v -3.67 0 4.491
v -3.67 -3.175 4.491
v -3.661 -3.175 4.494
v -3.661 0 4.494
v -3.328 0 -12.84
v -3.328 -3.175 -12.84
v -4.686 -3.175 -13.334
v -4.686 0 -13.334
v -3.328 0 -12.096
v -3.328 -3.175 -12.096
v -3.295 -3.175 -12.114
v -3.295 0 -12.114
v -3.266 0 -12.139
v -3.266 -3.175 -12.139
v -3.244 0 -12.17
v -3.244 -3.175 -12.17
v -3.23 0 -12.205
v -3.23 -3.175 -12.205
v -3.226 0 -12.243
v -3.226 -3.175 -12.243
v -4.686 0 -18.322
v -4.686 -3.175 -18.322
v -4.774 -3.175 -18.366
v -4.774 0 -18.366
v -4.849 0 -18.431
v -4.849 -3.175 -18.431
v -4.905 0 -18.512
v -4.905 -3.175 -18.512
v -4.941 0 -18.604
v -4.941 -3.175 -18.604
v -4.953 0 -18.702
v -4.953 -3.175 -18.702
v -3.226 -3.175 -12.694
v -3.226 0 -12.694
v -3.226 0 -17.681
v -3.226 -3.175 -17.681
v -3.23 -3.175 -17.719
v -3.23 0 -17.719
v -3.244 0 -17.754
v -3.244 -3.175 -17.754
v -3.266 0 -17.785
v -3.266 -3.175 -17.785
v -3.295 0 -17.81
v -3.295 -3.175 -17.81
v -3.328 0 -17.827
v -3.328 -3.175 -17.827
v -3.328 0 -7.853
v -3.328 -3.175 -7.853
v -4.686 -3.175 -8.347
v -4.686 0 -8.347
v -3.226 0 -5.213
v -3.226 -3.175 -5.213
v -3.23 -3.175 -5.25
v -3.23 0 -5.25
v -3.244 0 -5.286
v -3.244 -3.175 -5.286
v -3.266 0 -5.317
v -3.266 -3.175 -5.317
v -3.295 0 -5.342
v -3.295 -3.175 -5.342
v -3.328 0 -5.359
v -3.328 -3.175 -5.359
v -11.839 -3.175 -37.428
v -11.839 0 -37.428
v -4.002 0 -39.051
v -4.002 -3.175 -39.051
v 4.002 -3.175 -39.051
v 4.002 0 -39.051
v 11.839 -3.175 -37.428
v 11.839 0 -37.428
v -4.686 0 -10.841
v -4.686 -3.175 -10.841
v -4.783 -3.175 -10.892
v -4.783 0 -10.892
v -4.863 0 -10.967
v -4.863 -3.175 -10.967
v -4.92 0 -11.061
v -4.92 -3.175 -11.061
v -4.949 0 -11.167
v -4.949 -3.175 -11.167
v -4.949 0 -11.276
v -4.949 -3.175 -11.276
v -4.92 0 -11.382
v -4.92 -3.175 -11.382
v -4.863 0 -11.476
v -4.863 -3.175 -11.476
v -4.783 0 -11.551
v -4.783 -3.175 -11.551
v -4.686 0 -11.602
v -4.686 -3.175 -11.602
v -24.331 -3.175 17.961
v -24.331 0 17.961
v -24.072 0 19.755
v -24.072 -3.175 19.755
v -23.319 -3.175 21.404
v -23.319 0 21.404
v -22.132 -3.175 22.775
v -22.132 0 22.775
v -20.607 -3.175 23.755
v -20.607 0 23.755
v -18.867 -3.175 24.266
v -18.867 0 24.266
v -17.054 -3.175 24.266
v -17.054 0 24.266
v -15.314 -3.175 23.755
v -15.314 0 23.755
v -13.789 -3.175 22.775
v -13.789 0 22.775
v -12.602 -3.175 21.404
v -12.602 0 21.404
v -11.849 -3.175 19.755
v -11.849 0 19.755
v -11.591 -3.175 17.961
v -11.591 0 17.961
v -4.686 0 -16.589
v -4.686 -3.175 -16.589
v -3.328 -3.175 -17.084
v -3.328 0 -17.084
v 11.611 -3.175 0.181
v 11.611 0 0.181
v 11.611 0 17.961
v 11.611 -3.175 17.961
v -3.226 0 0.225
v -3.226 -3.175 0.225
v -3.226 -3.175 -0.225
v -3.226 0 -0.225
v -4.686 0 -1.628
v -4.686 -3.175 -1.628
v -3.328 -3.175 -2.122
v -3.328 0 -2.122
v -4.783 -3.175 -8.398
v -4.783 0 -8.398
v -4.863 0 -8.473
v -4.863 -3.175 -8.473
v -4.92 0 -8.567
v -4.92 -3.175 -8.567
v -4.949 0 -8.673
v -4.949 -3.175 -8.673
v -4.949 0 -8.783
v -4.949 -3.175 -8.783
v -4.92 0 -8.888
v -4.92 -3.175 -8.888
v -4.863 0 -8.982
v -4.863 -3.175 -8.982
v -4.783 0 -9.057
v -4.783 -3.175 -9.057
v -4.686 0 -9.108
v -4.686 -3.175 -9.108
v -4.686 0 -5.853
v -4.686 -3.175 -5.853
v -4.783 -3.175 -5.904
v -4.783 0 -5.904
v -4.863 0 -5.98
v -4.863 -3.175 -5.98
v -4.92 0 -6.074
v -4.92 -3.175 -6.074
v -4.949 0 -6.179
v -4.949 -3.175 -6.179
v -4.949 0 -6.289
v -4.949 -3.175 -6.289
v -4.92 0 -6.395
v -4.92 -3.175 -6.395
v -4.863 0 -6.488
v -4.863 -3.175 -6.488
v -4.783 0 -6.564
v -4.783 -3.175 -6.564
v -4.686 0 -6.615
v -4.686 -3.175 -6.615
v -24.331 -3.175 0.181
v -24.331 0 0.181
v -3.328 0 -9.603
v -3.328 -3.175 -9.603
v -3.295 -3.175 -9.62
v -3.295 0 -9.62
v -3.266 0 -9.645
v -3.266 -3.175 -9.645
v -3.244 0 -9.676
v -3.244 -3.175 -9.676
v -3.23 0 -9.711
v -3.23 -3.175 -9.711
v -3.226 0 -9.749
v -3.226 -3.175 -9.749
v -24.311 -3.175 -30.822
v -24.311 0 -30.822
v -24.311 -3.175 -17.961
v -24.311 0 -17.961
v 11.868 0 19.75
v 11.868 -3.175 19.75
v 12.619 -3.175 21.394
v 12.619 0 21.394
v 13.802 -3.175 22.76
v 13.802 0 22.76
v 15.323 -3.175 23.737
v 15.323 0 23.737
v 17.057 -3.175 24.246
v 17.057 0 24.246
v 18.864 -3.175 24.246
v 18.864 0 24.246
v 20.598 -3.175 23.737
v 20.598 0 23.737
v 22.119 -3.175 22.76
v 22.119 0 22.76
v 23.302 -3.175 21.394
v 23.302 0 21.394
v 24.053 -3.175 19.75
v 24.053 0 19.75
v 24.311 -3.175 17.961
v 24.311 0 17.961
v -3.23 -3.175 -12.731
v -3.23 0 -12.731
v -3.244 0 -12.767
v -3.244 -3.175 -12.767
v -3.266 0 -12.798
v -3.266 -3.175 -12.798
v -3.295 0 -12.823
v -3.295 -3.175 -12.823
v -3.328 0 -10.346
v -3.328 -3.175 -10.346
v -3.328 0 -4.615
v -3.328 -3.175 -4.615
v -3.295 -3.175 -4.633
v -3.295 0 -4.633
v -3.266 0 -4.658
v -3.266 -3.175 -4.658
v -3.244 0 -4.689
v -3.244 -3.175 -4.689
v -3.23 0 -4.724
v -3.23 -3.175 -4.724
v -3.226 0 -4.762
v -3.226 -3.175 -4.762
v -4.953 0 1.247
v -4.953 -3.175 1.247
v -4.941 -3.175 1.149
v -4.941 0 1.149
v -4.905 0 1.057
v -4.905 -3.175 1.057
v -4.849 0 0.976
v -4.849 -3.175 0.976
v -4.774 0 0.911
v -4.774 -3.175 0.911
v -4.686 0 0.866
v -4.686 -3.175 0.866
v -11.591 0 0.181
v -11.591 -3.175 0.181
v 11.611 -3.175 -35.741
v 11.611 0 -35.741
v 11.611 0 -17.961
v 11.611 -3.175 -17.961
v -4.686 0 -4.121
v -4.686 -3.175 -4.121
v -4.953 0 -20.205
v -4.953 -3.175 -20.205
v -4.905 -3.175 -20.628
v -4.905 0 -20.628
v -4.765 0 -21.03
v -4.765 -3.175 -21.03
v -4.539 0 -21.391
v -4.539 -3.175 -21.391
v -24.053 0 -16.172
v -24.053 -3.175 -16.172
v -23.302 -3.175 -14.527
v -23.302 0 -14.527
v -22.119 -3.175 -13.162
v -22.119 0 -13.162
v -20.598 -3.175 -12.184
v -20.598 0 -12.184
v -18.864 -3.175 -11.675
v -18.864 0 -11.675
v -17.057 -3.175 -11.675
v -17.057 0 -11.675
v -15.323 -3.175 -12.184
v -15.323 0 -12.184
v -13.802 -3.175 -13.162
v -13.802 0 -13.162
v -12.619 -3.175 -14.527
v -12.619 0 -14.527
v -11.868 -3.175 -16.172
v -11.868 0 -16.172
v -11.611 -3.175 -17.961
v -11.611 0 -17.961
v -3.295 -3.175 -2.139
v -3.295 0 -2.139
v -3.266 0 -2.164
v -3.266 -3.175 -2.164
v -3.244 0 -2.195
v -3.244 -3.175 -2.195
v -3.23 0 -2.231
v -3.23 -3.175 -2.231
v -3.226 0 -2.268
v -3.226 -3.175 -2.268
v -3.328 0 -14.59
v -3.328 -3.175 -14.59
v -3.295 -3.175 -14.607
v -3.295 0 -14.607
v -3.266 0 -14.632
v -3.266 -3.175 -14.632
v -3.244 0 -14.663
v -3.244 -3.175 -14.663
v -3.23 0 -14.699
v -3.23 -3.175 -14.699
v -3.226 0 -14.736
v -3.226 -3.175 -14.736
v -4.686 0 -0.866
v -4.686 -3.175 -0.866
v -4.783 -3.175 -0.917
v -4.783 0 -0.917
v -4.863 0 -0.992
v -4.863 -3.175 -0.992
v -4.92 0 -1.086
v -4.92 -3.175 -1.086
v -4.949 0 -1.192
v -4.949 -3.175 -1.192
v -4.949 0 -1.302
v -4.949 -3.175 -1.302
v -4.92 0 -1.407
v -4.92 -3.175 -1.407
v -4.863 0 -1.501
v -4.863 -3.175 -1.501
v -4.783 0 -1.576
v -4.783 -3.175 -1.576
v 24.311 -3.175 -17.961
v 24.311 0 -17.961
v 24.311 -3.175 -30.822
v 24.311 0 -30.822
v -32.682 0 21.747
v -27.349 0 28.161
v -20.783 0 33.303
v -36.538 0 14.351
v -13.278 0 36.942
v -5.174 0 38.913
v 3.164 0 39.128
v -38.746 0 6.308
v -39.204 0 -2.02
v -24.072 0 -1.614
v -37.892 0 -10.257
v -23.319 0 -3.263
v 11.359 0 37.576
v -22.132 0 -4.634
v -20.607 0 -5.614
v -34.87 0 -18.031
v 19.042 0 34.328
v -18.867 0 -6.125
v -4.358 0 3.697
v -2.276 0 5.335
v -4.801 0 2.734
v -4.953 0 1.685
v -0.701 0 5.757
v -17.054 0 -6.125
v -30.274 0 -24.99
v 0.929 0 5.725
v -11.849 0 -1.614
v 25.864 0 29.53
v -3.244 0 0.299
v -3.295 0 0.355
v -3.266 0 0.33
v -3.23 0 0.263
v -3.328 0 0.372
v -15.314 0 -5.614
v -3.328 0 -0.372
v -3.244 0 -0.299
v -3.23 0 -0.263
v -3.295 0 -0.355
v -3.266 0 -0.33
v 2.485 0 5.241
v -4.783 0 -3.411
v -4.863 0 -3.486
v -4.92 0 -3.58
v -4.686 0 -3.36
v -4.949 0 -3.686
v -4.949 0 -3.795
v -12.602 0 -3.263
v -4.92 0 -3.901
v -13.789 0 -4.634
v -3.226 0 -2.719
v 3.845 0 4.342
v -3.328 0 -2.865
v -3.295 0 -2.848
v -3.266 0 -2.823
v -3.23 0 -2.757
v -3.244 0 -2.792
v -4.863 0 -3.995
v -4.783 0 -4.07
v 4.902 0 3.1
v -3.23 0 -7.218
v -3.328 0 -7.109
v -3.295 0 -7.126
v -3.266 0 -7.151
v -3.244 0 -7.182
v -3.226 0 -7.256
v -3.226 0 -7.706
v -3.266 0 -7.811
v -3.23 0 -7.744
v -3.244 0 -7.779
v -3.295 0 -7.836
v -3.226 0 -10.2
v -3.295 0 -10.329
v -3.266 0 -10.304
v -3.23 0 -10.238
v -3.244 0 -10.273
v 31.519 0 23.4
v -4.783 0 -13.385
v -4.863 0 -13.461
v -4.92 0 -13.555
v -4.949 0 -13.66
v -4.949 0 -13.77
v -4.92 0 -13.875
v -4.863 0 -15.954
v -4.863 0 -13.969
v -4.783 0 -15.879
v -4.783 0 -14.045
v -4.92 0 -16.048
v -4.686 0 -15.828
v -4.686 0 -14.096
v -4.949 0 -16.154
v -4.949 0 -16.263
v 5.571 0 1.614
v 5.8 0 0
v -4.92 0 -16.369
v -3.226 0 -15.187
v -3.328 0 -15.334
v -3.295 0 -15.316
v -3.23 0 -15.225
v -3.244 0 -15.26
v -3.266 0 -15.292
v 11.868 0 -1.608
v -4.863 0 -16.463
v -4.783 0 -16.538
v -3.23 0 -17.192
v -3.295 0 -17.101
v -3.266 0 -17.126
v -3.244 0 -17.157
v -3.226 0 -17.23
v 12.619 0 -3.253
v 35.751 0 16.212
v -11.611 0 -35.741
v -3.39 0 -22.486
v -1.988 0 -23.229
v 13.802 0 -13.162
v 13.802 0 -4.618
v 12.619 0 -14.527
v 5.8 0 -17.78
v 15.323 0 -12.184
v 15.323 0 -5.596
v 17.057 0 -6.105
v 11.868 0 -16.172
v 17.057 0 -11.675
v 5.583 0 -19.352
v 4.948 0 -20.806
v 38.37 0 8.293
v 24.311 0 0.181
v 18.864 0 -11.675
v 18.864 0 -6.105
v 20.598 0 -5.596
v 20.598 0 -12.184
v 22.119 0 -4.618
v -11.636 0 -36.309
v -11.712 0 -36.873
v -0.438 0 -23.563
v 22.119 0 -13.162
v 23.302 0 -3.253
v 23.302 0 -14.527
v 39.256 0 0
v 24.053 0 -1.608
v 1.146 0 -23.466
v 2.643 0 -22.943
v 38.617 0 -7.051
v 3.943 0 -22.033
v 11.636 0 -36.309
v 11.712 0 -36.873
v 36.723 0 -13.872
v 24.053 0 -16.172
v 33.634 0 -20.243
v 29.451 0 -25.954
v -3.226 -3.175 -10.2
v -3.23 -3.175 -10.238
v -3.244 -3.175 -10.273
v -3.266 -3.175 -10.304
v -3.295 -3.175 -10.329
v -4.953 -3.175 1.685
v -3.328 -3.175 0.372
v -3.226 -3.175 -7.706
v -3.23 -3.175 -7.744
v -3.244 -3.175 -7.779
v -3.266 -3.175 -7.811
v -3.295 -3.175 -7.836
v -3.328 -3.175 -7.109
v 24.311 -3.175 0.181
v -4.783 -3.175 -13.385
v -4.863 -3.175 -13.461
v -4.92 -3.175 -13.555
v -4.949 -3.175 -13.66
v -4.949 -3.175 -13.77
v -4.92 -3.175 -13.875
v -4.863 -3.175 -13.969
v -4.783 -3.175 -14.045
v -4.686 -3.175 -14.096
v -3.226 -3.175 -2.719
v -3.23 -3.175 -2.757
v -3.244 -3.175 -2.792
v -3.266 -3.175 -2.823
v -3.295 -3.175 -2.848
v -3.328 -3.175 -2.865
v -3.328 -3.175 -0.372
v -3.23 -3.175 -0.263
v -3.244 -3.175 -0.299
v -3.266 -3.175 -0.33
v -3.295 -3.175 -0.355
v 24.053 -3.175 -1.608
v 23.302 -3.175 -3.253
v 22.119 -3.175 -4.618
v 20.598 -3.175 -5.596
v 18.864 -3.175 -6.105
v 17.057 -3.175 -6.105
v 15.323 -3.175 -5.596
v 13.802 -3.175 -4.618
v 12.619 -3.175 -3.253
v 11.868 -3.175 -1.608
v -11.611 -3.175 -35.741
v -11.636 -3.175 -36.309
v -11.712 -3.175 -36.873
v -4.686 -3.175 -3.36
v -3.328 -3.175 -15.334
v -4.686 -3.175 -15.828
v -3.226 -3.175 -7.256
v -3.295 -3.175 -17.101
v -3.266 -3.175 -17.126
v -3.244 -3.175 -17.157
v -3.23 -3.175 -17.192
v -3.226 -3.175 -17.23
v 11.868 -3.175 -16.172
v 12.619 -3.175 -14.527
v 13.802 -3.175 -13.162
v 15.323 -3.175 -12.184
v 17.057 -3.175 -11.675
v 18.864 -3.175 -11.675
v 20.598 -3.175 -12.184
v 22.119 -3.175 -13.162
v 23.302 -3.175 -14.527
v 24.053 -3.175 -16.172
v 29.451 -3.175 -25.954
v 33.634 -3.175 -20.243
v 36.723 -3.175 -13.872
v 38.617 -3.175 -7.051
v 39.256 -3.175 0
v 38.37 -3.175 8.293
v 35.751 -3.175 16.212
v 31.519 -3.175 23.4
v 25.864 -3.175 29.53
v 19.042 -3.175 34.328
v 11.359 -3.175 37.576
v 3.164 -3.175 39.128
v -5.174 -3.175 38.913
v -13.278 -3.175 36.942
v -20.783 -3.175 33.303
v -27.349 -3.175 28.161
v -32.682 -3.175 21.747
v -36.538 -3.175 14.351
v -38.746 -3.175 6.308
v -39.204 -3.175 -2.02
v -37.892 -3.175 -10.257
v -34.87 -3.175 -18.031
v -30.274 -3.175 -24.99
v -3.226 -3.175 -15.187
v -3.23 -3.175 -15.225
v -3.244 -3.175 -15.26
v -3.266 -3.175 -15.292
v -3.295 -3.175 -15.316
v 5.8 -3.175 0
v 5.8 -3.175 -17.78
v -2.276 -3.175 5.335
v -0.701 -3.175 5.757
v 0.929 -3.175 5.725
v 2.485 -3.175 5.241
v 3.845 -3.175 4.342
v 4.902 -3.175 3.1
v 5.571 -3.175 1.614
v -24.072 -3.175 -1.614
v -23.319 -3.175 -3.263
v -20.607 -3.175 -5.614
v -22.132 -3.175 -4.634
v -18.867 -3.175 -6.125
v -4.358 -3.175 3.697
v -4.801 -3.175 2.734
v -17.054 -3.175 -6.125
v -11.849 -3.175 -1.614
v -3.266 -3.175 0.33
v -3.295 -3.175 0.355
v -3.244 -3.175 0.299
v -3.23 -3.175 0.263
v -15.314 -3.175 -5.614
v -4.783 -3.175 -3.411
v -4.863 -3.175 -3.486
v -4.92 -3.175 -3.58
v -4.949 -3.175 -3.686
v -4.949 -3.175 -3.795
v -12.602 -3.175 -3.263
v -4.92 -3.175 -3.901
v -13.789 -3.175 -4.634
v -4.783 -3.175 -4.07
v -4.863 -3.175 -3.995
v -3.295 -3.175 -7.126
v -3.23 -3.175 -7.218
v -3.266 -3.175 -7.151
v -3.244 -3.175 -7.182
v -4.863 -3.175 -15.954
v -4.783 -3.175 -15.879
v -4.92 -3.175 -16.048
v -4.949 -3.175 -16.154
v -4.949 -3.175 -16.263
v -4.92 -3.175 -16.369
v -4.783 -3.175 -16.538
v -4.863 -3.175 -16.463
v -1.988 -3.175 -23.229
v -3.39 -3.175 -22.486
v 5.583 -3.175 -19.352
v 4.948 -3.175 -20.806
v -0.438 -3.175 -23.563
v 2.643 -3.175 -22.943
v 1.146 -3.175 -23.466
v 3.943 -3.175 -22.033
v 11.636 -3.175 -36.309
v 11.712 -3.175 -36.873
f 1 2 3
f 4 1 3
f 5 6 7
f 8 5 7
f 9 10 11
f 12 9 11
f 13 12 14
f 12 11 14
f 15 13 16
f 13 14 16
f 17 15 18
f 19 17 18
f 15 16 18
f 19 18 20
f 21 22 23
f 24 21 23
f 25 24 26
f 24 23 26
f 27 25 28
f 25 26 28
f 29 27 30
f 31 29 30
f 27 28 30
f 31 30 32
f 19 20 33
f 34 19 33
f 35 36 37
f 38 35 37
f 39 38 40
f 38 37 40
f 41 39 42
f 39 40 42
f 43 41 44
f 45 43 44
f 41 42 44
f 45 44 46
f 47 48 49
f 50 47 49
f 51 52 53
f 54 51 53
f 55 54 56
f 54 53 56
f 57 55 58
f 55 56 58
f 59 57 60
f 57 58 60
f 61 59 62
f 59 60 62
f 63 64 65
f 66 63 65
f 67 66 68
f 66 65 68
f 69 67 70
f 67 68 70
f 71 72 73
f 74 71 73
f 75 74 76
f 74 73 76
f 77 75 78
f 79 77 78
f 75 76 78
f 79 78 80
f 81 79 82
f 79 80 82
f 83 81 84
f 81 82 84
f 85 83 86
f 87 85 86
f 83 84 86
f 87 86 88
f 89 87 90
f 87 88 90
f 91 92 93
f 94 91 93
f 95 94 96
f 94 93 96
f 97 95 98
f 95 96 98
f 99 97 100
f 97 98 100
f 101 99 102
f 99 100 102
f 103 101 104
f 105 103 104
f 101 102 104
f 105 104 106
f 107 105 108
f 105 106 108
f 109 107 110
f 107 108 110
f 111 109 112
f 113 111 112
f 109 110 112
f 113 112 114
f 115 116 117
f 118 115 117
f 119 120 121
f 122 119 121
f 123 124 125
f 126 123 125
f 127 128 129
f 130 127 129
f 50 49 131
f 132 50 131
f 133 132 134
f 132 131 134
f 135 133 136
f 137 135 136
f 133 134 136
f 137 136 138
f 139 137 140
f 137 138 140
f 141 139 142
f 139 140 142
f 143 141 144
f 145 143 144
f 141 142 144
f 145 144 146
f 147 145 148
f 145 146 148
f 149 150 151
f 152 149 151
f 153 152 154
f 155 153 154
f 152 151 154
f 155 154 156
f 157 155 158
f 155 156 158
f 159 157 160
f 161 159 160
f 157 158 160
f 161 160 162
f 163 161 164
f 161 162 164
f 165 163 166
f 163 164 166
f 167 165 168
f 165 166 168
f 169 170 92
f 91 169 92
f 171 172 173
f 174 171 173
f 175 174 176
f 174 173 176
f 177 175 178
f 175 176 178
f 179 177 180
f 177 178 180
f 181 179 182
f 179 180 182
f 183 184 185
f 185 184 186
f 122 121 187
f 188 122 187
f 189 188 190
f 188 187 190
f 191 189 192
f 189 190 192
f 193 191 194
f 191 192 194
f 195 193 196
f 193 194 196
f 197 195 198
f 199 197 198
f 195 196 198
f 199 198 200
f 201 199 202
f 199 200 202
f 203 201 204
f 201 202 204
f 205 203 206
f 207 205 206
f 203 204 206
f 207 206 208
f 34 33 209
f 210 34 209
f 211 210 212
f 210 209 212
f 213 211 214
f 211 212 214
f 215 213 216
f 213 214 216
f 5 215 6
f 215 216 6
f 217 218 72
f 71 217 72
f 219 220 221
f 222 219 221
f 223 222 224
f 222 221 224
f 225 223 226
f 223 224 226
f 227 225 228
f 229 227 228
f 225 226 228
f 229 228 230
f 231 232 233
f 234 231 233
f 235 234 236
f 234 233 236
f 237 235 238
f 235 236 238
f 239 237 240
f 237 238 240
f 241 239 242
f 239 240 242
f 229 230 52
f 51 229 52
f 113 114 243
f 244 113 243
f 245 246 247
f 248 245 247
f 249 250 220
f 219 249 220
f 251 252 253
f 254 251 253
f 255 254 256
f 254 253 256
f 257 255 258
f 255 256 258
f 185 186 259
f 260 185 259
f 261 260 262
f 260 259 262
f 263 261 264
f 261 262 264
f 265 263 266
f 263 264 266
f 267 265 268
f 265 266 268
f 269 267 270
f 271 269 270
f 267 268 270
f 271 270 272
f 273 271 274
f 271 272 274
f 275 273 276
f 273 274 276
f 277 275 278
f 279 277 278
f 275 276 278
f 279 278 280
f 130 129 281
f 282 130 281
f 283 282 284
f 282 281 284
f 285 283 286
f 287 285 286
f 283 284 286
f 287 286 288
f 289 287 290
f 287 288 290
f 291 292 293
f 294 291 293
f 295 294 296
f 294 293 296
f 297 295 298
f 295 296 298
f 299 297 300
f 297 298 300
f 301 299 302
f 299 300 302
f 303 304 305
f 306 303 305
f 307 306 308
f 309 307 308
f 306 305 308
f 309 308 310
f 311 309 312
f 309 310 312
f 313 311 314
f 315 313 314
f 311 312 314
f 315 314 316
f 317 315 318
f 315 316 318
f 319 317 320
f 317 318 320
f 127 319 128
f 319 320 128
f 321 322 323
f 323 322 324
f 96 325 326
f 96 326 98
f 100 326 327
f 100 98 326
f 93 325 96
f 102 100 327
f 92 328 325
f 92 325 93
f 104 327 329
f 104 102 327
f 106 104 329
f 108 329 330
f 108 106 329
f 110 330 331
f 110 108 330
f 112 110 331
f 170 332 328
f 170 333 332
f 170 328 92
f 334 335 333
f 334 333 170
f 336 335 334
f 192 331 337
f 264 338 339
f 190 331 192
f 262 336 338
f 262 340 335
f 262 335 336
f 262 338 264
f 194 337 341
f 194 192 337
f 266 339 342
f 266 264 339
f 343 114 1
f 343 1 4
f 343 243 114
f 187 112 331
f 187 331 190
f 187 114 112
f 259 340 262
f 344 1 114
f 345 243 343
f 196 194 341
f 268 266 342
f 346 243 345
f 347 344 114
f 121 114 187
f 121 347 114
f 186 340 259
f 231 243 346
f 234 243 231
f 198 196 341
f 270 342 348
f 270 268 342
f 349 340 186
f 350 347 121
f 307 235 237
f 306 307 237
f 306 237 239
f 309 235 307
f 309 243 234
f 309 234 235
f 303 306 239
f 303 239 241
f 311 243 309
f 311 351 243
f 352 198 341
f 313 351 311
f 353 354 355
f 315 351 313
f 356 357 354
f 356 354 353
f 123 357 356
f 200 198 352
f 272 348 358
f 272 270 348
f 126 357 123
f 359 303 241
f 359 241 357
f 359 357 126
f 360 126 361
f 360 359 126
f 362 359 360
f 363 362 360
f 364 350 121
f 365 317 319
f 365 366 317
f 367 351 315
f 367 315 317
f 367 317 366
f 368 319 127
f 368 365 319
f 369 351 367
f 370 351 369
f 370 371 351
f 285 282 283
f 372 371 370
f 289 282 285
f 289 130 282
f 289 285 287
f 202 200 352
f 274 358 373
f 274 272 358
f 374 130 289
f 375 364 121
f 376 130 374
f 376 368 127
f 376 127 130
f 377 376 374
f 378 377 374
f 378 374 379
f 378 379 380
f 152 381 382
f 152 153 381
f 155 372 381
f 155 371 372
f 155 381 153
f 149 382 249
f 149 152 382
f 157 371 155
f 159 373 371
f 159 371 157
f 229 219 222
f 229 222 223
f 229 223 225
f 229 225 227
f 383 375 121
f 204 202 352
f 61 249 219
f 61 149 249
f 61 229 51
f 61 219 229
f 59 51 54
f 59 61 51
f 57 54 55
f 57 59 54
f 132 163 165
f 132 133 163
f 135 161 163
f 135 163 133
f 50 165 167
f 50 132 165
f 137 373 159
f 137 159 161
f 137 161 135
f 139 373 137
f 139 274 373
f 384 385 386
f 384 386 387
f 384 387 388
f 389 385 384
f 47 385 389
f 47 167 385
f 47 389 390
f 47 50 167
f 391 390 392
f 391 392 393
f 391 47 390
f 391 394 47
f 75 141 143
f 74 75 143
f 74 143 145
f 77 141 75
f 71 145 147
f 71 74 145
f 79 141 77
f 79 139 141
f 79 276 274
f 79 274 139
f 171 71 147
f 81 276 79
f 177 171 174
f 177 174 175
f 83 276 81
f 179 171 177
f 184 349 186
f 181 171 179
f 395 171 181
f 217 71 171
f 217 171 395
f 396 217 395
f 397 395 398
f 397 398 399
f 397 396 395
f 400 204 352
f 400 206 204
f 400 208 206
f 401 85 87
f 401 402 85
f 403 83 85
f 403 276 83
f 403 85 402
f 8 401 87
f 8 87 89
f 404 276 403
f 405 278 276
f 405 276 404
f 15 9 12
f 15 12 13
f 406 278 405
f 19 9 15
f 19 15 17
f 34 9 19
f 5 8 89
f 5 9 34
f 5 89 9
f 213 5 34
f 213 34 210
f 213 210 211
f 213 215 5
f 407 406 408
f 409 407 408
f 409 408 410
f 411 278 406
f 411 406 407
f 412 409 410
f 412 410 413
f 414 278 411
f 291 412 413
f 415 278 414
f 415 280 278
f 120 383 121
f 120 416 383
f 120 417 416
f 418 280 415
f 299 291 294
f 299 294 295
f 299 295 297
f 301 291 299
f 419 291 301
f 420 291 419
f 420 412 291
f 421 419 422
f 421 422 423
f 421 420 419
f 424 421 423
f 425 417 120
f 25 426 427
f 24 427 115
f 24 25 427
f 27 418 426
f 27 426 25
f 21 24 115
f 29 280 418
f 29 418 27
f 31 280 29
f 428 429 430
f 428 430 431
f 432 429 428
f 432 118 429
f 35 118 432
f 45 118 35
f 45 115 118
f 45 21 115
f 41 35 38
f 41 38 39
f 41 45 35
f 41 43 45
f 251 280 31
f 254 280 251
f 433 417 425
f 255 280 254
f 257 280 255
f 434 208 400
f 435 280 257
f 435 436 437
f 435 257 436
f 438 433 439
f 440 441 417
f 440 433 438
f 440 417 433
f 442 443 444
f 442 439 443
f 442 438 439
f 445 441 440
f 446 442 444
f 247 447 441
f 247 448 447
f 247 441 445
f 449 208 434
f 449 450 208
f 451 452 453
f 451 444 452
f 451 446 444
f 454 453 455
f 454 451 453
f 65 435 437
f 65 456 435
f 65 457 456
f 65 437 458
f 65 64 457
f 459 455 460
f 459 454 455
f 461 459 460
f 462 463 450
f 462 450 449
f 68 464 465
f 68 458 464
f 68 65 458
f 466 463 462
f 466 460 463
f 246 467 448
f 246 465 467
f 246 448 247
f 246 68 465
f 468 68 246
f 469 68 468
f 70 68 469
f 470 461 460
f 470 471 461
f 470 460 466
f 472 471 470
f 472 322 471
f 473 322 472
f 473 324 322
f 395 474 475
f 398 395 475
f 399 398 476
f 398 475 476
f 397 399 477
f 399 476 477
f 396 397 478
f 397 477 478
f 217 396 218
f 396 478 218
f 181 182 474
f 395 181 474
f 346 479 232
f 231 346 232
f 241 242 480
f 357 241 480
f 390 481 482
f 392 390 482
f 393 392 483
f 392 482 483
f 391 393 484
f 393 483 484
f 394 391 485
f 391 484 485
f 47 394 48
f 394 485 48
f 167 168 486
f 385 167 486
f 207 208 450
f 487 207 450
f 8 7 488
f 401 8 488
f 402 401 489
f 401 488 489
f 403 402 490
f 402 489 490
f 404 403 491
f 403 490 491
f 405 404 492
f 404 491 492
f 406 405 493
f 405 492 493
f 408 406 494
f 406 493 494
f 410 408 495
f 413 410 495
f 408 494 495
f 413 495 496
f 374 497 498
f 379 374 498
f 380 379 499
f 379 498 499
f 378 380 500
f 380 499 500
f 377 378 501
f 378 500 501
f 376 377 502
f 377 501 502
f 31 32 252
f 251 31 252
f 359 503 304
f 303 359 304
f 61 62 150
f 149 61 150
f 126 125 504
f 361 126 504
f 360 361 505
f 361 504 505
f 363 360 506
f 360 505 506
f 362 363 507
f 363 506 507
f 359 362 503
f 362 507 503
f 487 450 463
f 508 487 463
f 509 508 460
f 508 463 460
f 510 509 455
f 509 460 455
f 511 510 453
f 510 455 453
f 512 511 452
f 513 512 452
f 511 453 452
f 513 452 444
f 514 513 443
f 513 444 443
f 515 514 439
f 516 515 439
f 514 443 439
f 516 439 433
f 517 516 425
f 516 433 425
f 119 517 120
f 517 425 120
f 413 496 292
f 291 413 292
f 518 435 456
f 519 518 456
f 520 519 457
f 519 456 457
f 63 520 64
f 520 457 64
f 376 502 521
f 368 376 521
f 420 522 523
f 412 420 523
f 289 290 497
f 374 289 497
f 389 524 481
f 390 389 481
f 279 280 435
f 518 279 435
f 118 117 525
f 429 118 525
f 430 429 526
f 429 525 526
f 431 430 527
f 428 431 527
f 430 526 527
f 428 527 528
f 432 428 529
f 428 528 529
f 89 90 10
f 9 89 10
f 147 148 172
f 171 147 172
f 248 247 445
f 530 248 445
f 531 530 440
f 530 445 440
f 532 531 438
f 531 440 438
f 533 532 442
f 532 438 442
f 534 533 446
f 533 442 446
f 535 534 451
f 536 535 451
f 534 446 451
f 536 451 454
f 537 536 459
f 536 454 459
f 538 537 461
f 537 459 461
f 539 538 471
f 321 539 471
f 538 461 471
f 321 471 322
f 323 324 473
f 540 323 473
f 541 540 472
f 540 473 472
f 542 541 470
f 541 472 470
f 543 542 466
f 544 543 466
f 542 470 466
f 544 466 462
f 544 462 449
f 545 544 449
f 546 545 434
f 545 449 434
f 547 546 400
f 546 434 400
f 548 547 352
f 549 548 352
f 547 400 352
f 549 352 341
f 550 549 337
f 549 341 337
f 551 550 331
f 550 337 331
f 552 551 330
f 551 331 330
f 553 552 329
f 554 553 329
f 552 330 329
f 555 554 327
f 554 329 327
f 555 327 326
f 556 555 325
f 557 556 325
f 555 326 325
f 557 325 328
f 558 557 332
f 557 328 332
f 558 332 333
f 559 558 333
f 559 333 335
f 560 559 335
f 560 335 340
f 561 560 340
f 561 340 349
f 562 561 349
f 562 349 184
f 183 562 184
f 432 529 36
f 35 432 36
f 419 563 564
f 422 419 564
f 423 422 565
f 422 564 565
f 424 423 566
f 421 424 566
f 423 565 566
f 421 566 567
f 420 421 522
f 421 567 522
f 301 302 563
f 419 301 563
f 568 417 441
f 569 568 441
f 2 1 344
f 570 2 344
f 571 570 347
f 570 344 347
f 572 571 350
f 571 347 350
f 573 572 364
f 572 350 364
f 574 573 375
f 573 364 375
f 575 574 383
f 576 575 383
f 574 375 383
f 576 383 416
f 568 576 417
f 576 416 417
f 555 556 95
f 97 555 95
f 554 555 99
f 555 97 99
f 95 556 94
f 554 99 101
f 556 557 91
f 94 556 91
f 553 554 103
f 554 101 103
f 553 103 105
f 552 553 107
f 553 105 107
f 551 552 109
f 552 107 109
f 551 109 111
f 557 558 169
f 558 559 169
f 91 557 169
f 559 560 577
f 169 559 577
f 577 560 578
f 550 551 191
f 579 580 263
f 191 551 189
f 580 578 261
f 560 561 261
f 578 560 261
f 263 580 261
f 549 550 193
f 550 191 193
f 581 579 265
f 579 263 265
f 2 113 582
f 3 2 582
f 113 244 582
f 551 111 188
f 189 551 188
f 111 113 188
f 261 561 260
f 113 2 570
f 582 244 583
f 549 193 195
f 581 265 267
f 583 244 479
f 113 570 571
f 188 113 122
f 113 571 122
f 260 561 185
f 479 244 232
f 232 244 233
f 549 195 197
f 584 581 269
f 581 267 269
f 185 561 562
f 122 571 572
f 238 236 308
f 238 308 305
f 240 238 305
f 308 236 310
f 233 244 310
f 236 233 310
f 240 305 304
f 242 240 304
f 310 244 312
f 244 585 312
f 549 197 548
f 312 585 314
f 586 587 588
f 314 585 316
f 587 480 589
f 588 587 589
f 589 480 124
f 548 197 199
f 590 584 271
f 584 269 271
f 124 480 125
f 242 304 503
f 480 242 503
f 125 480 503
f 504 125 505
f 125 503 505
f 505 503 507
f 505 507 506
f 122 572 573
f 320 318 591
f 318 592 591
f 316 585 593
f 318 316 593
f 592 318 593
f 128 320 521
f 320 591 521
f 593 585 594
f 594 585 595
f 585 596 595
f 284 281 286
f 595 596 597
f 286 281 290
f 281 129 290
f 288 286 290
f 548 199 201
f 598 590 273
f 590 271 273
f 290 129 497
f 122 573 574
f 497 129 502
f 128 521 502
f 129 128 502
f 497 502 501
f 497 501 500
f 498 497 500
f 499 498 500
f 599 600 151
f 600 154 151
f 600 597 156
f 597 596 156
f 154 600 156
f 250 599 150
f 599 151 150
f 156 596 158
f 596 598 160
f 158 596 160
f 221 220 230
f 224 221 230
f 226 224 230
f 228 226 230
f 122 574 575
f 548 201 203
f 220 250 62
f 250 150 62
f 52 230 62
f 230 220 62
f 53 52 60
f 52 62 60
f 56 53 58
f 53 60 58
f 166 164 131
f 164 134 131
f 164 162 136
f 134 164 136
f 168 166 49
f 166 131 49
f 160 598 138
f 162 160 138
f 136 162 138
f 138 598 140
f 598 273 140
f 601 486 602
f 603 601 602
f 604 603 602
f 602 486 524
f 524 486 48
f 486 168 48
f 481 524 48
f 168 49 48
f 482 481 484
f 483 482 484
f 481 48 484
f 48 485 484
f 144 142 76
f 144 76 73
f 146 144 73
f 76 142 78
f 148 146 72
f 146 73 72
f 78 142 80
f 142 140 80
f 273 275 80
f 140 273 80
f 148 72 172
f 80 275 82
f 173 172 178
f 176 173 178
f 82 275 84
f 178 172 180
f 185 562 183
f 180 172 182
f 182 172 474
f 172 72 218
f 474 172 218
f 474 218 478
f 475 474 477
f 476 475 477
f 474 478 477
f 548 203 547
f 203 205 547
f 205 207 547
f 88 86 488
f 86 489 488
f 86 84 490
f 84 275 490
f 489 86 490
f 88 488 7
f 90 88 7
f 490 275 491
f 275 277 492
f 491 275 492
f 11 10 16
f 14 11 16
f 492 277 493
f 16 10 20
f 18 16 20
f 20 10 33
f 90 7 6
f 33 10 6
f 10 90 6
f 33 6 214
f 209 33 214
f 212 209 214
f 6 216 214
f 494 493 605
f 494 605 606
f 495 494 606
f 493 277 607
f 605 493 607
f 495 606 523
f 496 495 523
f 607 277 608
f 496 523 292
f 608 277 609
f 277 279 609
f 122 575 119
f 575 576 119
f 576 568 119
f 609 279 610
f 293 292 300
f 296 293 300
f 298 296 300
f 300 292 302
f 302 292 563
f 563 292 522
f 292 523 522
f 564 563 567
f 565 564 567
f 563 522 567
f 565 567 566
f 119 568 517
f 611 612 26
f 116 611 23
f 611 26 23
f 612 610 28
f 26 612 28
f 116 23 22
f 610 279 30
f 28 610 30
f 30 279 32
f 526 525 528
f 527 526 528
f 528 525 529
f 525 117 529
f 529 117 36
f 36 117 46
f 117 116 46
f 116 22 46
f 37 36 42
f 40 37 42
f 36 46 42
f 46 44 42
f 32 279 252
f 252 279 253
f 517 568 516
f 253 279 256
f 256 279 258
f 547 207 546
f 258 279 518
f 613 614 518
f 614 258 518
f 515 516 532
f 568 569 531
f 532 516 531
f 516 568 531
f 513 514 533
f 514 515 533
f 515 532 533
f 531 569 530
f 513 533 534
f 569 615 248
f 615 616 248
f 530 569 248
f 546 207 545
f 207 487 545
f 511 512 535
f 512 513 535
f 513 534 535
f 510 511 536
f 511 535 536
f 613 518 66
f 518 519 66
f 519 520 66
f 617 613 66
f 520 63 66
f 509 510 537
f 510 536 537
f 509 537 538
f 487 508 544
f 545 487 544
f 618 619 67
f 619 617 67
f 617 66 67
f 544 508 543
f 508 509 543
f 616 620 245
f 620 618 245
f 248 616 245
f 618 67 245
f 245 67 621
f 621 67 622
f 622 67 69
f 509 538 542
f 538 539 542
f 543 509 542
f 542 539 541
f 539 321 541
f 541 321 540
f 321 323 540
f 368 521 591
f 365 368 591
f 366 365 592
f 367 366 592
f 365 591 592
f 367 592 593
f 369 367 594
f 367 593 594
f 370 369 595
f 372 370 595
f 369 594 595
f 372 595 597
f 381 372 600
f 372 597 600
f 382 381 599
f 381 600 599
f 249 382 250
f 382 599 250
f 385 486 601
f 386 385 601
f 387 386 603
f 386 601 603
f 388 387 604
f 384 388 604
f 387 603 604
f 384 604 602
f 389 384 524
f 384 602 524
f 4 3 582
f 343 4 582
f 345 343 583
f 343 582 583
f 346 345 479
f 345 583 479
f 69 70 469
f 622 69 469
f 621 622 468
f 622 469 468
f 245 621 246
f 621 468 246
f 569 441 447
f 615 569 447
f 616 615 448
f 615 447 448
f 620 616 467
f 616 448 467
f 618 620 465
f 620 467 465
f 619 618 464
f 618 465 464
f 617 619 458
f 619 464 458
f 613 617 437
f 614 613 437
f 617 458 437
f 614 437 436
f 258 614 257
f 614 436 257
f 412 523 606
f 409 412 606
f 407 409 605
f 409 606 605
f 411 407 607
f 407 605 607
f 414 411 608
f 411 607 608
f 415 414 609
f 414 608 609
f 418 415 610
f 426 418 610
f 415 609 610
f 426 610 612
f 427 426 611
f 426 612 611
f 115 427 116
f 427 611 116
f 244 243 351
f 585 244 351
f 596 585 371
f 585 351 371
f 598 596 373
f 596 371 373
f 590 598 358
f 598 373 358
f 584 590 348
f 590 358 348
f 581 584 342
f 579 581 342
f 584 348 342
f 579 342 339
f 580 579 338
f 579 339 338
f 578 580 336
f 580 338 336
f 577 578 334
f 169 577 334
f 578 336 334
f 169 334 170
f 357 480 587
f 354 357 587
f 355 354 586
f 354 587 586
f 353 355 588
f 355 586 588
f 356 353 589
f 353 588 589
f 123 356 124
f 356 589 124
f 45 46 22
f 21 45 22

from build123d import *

# Parameters (mm, degrees)
BOSS_EXTRUDE1_DEPTH = 3.175
BOSS_EXTRUDE3_START = -3.175
BOSS_EXTRUDE3_DEPTH = 3.175


# Read off the part's stored shape, not the designer's step: Boss-Extrude3
with BuildPart() as part:
    # Sketch3 → Boss-Extrude1 (new body)
    with BuildSketch(Plane.XZ):
        with BuildLine():
            ThreePointArc((39.2557, 0), (-17.127226966, 35.322345321), (-24.310512242, -30.822215641))
            Line((-24.310512242, -30.822215641), (-24.310512242, -17.960512242))
            ThreePointArc((-24.310512242, -17.960512242), (-17.960512242, -11.610512242), (-11.610512242, -17.960512242))
            Line((-11.610512242, -17.960512242), (-11.610512242, -35.740512242))
            ThreePointArc((-11.610512242, -35.740512242), (-11.667849962, -36.591923676), (-11.838827653, -37.427959366))
            ThreePointArc((-11.838827653, -37.427959366), (0, -39.2557), (11.838827653, -37.427959366))
            ThreePointArc((11.838827653, -37.427959366), (11.667849962, -36.591923676), (11.610512242, -35.740512242))
            Line((11.610512242, -35.740512242), (11.610512242, -17.960512242))
            ThreePointArc((11.610512242, -17.960512242), (17.960512242, -11.610512242), (24.310512242, -17.960512242))
            Line((24.310512242, -17.960512242), (24.310512242, -30.822215641))
            ThreePointArc((24.310512242, -30.822215641), (35.322345321, -17.127226966), (39.2557, 0))
        make_face()
        with BuildLine():
            ThreePointArc((-5.8, 0), (0, 5.8), (5.8, 0))
            Line((5.8, 0), (5.8, -17.78))
            ThreePointArc((5.8, -17.78), (0, -23.58), (-5.8, -17.78))
            Line((-5.8, -17.78), (-5.8, 0))
        make_face(mode=Mode.SUBTRACT)
        with BuildLine():
            ThreePointArc((-11.590512242, 0.180512242), (-17.960512242, -6.189487758), (-24.330512242, 0.180512242))
            Line((-24.330512242, 0.180512242), (-24.330512242, 17.960512242))
            ThreePointArc((-24.330512242, 17.960512242), (-17.960512242, 24.330512242), (-11.590512242, 17.960512242))
            Line((-11.590512242, 17.960512242), (-11.590512242, 0.180512242))
        make_face(mode=Mode.SUBTRACT)
        with BuildLine():
            ThreePointArc((24.310512242, 0.180512242), (17.960512242, -6.169487758), (11.610512242, 0.180512242))
            Line((11.610512242, 0.180512242), (11.610512242, 17.960512242))
            ThreePointArc((11.610512242, 17.960512242), (17.960512242, 24.310512242), (24.310512242, 17.960512242))
            Line((24.310512242, 17.960512242), (24.310512242, 0.180512242))
        make_face(mode=Mode.SUBTRACT)
    extrude(amount=BOSS_EXTRUDE1_DEPTH)

    # Boss-Extrude3 outline → Boss-Extrude3 (add)
    with BuildSketch(Plane(origin=(0, 0, 0), x_dir=(1, 0, 0), z_dir=(0, 1, 0)).offset(BOSS_EXTRUDE3_START)):
        with BuildLine():
            Line((-4.952891864, -1.684975141), (-4.952891864, -1.246819584))
            ThreePointArc((-4.952891864, -1.246819584), (-4.879618202, -1.014425219), (-4.6863, -0.866086946))
            Line((-4.6863, -0.866086946), (-3.328347771, -0.371832755))
            ThreePointArc((-3.328347771, -0.371832755), (-3.253985597, -0.314772651), (-3.2258, -0.22537936))
            Line((-3.2258, -0.22537936), (-3.2258, 0.22537936))
            ThreePointArc((-3.2258, 0.22537936), (-3.253985597, 0.314772651), (-3.328347771, 0.371832755))
            Line((-3.328347771, 0.371832755), (-4.6863, 0.866086946))
            ThreePointArc((-4.6863, 0.866086946), (-4.952891864, 1.246819585), (-4.6863, 1.627552223))
            Line((-4.6863, 1.627552223), (-3.328347771, 2.121806414))
            ThreePointArc((-3.328347771, 2.121806414), (-3.253985597, 2.178866518), (-3.2258, 2.268259809))
            Line((-3.2258, 2.268259809), (-3.2258, 2.719018529))
            ThreePointArc((-3.2258, 2.719018529), (-3.253985597, 2.80841182), (-3.328347771, 2.865471924))
            Line((-3.328347771, 2.865471924), (-4.6863, 3.359726115))
            ThreePointArc((-4.6863, 3.359726115), (-4.952891864, 3.740458754), (-4.6863, 4.121191392))
            Line((-4.6863, 4.121191392), (-3.328347771, 4.615445582))
            ThreePointArc((-3.328347771, 4.615445582), (-3.253985597, 4.672505686), (-3.2258, 4.761898978))
            Line((-3.2258, 4.761898978), (-3.2258, 5.212657697))
            ThreePointArc((-3.2258, 5.212657697), (-3.253985597, 5.302050989), (-3.328347771, 5.359111093))
            Line((-3.328347771, 5.359111093), (-4.6863, 5.853365283))
            ThreePointArc((-4.6863, 5.853365283), (-4.952891864, 6.234097921), (-4.6863, 6.61483056))
            Line((-4.6863, 6.61483056), (-3.328347771, 7.109084751))
            ThreePointArc((-3.328347771, 7.109084751), (-3.253985597, 7.166144855), (-3.2258, 7.255538147))
            Line((-3.2258, 7.255538147), (-3.2258, 7.706296866))
            ThreePointArc((-3.2258, 7.706296866), (-3.253985597, 7.795690157), (-3.328347771, 7.852750261))
            Line((-3.328347771, 7.852750261), (-4.6863, 8.347004452))
            ThreePointArc((-4.6863, 8.347004452), (-4.952891864, 8.72773709), (-4.6863, 9.108469729))
            Line((-4.6863, 9.108469729), (-3.328347771, 9.60272392))
            ThreePointArc((-3.328347771, 9.60272392), (-3.253985597, 9.659784024), (-3.2258, 9.749177315))
            Line((-3.2258, 9.749177315), (-3.2258, 10.199936035))
            ThreePointArc((-3.2258, 10.199936035), (-3.253985597, 10.289329326), (-3.328347771, 10.34638943))
            Line((-3.328347771, 10.34638943), (-4.6863, 10.840643621))
            ThreePointArc((-4.6863, 10.840643621), (-4.952891864, 11.221376259), (-4.6863, 11.602108898))
            Line((-4.6863, 11.602108898), (-3.328347771, 12.096363089))
            ThreePointArc((-3.328347771, 12.096363089), (-3.253985597, 12.153423193), (-3.2258, 12.242816484))
            Line((-3.2258, 12.242816484), (-3.2258, 12.693575204))
            ThreePointArc((-3.2258, 12.693575204), (-3.253985597, 12.782968495), (-3.328347771, 12.840028599))
            Line((-3.328347771, 12.840028599), (-4.6863, 13.33428279))
            ThreePointArc((-4.6863, 13.33428279), (-4.952891864, 13.715015428), (-4.6863, 14.095748067))
            Line((-4.6863, 14.095748067), (-3.328347771, 14.590002258))
            ThreePointArc((-3.328347771, 14.590002258), (-3.253985597, 14.647062362), (-3.2258, 14.736455653))
            Line((-3.2258, 14.736455653), (-3.2258, 15.187214372))
            ThreePointArc((-3.2258, 15.187214372), (-3.253985597, 15.276607664), (-3.328347771, 15.333667768))
            Line((-3.328347771, 15.333667768), (-4.6863, 15.827921959))
            ThreePointArc((-4.6863, 15.827921959), (-4.952891864, 16.208654598), (-4.6863, 16.589387236))
            Line((-4.6863, 16.589387236), (-3.328347771, 17.083641426))
            ThreePointArc((-3.328347771, 17.083641426), (-3.253985597, 17.14070153), (-3.2258, 17.230094822))
            Line((-3.2258, 17.230094822), (-3.2258, 17.680853541))
            ThreePointArc((-3.2258, 17.680853541), (-3.253985597, 17.770246833), (-3.328347771, 17.827306937))
            Line((-3.328347771, 17.827306937), (-4.6863, 18.321561127))
            ThreePointArc((-4.6863, 18.321561127), (-4.879618202, 18.469899401), (-4.952891864, 18.702293766))
            Line((-4.952891864, 18.702293766), (-4.952891864, 20.205203806))
            ThreePointArc((-4.952891864, 20.205203806), (-4.846345509, 20.833344029), (-4.538625549, 21.391215602))
            ThreePointArc((-4.538625549, 21.391215602), (-5.475583448, 19.692586183), (-5.8, 17.78))
            Line((-5.8, 17.78), (-5.8, 0))
            ThreePointArc((-5.8, 0), (-5.240594871, -2.485189209), (-3.670287792, -4.490989593))
            Line((-3.670287792, -4.490989593), (-3.66100885, -4.494366852))
            ThreePointArc((-3.66100885, -4.494366852), (-4.614444615, -3.231070506), (-4.952891864, -1.684975141))
        make_face()
    extrude(amount=BOSS_EXTRUDE3_DEPTH)


solid = part.part
